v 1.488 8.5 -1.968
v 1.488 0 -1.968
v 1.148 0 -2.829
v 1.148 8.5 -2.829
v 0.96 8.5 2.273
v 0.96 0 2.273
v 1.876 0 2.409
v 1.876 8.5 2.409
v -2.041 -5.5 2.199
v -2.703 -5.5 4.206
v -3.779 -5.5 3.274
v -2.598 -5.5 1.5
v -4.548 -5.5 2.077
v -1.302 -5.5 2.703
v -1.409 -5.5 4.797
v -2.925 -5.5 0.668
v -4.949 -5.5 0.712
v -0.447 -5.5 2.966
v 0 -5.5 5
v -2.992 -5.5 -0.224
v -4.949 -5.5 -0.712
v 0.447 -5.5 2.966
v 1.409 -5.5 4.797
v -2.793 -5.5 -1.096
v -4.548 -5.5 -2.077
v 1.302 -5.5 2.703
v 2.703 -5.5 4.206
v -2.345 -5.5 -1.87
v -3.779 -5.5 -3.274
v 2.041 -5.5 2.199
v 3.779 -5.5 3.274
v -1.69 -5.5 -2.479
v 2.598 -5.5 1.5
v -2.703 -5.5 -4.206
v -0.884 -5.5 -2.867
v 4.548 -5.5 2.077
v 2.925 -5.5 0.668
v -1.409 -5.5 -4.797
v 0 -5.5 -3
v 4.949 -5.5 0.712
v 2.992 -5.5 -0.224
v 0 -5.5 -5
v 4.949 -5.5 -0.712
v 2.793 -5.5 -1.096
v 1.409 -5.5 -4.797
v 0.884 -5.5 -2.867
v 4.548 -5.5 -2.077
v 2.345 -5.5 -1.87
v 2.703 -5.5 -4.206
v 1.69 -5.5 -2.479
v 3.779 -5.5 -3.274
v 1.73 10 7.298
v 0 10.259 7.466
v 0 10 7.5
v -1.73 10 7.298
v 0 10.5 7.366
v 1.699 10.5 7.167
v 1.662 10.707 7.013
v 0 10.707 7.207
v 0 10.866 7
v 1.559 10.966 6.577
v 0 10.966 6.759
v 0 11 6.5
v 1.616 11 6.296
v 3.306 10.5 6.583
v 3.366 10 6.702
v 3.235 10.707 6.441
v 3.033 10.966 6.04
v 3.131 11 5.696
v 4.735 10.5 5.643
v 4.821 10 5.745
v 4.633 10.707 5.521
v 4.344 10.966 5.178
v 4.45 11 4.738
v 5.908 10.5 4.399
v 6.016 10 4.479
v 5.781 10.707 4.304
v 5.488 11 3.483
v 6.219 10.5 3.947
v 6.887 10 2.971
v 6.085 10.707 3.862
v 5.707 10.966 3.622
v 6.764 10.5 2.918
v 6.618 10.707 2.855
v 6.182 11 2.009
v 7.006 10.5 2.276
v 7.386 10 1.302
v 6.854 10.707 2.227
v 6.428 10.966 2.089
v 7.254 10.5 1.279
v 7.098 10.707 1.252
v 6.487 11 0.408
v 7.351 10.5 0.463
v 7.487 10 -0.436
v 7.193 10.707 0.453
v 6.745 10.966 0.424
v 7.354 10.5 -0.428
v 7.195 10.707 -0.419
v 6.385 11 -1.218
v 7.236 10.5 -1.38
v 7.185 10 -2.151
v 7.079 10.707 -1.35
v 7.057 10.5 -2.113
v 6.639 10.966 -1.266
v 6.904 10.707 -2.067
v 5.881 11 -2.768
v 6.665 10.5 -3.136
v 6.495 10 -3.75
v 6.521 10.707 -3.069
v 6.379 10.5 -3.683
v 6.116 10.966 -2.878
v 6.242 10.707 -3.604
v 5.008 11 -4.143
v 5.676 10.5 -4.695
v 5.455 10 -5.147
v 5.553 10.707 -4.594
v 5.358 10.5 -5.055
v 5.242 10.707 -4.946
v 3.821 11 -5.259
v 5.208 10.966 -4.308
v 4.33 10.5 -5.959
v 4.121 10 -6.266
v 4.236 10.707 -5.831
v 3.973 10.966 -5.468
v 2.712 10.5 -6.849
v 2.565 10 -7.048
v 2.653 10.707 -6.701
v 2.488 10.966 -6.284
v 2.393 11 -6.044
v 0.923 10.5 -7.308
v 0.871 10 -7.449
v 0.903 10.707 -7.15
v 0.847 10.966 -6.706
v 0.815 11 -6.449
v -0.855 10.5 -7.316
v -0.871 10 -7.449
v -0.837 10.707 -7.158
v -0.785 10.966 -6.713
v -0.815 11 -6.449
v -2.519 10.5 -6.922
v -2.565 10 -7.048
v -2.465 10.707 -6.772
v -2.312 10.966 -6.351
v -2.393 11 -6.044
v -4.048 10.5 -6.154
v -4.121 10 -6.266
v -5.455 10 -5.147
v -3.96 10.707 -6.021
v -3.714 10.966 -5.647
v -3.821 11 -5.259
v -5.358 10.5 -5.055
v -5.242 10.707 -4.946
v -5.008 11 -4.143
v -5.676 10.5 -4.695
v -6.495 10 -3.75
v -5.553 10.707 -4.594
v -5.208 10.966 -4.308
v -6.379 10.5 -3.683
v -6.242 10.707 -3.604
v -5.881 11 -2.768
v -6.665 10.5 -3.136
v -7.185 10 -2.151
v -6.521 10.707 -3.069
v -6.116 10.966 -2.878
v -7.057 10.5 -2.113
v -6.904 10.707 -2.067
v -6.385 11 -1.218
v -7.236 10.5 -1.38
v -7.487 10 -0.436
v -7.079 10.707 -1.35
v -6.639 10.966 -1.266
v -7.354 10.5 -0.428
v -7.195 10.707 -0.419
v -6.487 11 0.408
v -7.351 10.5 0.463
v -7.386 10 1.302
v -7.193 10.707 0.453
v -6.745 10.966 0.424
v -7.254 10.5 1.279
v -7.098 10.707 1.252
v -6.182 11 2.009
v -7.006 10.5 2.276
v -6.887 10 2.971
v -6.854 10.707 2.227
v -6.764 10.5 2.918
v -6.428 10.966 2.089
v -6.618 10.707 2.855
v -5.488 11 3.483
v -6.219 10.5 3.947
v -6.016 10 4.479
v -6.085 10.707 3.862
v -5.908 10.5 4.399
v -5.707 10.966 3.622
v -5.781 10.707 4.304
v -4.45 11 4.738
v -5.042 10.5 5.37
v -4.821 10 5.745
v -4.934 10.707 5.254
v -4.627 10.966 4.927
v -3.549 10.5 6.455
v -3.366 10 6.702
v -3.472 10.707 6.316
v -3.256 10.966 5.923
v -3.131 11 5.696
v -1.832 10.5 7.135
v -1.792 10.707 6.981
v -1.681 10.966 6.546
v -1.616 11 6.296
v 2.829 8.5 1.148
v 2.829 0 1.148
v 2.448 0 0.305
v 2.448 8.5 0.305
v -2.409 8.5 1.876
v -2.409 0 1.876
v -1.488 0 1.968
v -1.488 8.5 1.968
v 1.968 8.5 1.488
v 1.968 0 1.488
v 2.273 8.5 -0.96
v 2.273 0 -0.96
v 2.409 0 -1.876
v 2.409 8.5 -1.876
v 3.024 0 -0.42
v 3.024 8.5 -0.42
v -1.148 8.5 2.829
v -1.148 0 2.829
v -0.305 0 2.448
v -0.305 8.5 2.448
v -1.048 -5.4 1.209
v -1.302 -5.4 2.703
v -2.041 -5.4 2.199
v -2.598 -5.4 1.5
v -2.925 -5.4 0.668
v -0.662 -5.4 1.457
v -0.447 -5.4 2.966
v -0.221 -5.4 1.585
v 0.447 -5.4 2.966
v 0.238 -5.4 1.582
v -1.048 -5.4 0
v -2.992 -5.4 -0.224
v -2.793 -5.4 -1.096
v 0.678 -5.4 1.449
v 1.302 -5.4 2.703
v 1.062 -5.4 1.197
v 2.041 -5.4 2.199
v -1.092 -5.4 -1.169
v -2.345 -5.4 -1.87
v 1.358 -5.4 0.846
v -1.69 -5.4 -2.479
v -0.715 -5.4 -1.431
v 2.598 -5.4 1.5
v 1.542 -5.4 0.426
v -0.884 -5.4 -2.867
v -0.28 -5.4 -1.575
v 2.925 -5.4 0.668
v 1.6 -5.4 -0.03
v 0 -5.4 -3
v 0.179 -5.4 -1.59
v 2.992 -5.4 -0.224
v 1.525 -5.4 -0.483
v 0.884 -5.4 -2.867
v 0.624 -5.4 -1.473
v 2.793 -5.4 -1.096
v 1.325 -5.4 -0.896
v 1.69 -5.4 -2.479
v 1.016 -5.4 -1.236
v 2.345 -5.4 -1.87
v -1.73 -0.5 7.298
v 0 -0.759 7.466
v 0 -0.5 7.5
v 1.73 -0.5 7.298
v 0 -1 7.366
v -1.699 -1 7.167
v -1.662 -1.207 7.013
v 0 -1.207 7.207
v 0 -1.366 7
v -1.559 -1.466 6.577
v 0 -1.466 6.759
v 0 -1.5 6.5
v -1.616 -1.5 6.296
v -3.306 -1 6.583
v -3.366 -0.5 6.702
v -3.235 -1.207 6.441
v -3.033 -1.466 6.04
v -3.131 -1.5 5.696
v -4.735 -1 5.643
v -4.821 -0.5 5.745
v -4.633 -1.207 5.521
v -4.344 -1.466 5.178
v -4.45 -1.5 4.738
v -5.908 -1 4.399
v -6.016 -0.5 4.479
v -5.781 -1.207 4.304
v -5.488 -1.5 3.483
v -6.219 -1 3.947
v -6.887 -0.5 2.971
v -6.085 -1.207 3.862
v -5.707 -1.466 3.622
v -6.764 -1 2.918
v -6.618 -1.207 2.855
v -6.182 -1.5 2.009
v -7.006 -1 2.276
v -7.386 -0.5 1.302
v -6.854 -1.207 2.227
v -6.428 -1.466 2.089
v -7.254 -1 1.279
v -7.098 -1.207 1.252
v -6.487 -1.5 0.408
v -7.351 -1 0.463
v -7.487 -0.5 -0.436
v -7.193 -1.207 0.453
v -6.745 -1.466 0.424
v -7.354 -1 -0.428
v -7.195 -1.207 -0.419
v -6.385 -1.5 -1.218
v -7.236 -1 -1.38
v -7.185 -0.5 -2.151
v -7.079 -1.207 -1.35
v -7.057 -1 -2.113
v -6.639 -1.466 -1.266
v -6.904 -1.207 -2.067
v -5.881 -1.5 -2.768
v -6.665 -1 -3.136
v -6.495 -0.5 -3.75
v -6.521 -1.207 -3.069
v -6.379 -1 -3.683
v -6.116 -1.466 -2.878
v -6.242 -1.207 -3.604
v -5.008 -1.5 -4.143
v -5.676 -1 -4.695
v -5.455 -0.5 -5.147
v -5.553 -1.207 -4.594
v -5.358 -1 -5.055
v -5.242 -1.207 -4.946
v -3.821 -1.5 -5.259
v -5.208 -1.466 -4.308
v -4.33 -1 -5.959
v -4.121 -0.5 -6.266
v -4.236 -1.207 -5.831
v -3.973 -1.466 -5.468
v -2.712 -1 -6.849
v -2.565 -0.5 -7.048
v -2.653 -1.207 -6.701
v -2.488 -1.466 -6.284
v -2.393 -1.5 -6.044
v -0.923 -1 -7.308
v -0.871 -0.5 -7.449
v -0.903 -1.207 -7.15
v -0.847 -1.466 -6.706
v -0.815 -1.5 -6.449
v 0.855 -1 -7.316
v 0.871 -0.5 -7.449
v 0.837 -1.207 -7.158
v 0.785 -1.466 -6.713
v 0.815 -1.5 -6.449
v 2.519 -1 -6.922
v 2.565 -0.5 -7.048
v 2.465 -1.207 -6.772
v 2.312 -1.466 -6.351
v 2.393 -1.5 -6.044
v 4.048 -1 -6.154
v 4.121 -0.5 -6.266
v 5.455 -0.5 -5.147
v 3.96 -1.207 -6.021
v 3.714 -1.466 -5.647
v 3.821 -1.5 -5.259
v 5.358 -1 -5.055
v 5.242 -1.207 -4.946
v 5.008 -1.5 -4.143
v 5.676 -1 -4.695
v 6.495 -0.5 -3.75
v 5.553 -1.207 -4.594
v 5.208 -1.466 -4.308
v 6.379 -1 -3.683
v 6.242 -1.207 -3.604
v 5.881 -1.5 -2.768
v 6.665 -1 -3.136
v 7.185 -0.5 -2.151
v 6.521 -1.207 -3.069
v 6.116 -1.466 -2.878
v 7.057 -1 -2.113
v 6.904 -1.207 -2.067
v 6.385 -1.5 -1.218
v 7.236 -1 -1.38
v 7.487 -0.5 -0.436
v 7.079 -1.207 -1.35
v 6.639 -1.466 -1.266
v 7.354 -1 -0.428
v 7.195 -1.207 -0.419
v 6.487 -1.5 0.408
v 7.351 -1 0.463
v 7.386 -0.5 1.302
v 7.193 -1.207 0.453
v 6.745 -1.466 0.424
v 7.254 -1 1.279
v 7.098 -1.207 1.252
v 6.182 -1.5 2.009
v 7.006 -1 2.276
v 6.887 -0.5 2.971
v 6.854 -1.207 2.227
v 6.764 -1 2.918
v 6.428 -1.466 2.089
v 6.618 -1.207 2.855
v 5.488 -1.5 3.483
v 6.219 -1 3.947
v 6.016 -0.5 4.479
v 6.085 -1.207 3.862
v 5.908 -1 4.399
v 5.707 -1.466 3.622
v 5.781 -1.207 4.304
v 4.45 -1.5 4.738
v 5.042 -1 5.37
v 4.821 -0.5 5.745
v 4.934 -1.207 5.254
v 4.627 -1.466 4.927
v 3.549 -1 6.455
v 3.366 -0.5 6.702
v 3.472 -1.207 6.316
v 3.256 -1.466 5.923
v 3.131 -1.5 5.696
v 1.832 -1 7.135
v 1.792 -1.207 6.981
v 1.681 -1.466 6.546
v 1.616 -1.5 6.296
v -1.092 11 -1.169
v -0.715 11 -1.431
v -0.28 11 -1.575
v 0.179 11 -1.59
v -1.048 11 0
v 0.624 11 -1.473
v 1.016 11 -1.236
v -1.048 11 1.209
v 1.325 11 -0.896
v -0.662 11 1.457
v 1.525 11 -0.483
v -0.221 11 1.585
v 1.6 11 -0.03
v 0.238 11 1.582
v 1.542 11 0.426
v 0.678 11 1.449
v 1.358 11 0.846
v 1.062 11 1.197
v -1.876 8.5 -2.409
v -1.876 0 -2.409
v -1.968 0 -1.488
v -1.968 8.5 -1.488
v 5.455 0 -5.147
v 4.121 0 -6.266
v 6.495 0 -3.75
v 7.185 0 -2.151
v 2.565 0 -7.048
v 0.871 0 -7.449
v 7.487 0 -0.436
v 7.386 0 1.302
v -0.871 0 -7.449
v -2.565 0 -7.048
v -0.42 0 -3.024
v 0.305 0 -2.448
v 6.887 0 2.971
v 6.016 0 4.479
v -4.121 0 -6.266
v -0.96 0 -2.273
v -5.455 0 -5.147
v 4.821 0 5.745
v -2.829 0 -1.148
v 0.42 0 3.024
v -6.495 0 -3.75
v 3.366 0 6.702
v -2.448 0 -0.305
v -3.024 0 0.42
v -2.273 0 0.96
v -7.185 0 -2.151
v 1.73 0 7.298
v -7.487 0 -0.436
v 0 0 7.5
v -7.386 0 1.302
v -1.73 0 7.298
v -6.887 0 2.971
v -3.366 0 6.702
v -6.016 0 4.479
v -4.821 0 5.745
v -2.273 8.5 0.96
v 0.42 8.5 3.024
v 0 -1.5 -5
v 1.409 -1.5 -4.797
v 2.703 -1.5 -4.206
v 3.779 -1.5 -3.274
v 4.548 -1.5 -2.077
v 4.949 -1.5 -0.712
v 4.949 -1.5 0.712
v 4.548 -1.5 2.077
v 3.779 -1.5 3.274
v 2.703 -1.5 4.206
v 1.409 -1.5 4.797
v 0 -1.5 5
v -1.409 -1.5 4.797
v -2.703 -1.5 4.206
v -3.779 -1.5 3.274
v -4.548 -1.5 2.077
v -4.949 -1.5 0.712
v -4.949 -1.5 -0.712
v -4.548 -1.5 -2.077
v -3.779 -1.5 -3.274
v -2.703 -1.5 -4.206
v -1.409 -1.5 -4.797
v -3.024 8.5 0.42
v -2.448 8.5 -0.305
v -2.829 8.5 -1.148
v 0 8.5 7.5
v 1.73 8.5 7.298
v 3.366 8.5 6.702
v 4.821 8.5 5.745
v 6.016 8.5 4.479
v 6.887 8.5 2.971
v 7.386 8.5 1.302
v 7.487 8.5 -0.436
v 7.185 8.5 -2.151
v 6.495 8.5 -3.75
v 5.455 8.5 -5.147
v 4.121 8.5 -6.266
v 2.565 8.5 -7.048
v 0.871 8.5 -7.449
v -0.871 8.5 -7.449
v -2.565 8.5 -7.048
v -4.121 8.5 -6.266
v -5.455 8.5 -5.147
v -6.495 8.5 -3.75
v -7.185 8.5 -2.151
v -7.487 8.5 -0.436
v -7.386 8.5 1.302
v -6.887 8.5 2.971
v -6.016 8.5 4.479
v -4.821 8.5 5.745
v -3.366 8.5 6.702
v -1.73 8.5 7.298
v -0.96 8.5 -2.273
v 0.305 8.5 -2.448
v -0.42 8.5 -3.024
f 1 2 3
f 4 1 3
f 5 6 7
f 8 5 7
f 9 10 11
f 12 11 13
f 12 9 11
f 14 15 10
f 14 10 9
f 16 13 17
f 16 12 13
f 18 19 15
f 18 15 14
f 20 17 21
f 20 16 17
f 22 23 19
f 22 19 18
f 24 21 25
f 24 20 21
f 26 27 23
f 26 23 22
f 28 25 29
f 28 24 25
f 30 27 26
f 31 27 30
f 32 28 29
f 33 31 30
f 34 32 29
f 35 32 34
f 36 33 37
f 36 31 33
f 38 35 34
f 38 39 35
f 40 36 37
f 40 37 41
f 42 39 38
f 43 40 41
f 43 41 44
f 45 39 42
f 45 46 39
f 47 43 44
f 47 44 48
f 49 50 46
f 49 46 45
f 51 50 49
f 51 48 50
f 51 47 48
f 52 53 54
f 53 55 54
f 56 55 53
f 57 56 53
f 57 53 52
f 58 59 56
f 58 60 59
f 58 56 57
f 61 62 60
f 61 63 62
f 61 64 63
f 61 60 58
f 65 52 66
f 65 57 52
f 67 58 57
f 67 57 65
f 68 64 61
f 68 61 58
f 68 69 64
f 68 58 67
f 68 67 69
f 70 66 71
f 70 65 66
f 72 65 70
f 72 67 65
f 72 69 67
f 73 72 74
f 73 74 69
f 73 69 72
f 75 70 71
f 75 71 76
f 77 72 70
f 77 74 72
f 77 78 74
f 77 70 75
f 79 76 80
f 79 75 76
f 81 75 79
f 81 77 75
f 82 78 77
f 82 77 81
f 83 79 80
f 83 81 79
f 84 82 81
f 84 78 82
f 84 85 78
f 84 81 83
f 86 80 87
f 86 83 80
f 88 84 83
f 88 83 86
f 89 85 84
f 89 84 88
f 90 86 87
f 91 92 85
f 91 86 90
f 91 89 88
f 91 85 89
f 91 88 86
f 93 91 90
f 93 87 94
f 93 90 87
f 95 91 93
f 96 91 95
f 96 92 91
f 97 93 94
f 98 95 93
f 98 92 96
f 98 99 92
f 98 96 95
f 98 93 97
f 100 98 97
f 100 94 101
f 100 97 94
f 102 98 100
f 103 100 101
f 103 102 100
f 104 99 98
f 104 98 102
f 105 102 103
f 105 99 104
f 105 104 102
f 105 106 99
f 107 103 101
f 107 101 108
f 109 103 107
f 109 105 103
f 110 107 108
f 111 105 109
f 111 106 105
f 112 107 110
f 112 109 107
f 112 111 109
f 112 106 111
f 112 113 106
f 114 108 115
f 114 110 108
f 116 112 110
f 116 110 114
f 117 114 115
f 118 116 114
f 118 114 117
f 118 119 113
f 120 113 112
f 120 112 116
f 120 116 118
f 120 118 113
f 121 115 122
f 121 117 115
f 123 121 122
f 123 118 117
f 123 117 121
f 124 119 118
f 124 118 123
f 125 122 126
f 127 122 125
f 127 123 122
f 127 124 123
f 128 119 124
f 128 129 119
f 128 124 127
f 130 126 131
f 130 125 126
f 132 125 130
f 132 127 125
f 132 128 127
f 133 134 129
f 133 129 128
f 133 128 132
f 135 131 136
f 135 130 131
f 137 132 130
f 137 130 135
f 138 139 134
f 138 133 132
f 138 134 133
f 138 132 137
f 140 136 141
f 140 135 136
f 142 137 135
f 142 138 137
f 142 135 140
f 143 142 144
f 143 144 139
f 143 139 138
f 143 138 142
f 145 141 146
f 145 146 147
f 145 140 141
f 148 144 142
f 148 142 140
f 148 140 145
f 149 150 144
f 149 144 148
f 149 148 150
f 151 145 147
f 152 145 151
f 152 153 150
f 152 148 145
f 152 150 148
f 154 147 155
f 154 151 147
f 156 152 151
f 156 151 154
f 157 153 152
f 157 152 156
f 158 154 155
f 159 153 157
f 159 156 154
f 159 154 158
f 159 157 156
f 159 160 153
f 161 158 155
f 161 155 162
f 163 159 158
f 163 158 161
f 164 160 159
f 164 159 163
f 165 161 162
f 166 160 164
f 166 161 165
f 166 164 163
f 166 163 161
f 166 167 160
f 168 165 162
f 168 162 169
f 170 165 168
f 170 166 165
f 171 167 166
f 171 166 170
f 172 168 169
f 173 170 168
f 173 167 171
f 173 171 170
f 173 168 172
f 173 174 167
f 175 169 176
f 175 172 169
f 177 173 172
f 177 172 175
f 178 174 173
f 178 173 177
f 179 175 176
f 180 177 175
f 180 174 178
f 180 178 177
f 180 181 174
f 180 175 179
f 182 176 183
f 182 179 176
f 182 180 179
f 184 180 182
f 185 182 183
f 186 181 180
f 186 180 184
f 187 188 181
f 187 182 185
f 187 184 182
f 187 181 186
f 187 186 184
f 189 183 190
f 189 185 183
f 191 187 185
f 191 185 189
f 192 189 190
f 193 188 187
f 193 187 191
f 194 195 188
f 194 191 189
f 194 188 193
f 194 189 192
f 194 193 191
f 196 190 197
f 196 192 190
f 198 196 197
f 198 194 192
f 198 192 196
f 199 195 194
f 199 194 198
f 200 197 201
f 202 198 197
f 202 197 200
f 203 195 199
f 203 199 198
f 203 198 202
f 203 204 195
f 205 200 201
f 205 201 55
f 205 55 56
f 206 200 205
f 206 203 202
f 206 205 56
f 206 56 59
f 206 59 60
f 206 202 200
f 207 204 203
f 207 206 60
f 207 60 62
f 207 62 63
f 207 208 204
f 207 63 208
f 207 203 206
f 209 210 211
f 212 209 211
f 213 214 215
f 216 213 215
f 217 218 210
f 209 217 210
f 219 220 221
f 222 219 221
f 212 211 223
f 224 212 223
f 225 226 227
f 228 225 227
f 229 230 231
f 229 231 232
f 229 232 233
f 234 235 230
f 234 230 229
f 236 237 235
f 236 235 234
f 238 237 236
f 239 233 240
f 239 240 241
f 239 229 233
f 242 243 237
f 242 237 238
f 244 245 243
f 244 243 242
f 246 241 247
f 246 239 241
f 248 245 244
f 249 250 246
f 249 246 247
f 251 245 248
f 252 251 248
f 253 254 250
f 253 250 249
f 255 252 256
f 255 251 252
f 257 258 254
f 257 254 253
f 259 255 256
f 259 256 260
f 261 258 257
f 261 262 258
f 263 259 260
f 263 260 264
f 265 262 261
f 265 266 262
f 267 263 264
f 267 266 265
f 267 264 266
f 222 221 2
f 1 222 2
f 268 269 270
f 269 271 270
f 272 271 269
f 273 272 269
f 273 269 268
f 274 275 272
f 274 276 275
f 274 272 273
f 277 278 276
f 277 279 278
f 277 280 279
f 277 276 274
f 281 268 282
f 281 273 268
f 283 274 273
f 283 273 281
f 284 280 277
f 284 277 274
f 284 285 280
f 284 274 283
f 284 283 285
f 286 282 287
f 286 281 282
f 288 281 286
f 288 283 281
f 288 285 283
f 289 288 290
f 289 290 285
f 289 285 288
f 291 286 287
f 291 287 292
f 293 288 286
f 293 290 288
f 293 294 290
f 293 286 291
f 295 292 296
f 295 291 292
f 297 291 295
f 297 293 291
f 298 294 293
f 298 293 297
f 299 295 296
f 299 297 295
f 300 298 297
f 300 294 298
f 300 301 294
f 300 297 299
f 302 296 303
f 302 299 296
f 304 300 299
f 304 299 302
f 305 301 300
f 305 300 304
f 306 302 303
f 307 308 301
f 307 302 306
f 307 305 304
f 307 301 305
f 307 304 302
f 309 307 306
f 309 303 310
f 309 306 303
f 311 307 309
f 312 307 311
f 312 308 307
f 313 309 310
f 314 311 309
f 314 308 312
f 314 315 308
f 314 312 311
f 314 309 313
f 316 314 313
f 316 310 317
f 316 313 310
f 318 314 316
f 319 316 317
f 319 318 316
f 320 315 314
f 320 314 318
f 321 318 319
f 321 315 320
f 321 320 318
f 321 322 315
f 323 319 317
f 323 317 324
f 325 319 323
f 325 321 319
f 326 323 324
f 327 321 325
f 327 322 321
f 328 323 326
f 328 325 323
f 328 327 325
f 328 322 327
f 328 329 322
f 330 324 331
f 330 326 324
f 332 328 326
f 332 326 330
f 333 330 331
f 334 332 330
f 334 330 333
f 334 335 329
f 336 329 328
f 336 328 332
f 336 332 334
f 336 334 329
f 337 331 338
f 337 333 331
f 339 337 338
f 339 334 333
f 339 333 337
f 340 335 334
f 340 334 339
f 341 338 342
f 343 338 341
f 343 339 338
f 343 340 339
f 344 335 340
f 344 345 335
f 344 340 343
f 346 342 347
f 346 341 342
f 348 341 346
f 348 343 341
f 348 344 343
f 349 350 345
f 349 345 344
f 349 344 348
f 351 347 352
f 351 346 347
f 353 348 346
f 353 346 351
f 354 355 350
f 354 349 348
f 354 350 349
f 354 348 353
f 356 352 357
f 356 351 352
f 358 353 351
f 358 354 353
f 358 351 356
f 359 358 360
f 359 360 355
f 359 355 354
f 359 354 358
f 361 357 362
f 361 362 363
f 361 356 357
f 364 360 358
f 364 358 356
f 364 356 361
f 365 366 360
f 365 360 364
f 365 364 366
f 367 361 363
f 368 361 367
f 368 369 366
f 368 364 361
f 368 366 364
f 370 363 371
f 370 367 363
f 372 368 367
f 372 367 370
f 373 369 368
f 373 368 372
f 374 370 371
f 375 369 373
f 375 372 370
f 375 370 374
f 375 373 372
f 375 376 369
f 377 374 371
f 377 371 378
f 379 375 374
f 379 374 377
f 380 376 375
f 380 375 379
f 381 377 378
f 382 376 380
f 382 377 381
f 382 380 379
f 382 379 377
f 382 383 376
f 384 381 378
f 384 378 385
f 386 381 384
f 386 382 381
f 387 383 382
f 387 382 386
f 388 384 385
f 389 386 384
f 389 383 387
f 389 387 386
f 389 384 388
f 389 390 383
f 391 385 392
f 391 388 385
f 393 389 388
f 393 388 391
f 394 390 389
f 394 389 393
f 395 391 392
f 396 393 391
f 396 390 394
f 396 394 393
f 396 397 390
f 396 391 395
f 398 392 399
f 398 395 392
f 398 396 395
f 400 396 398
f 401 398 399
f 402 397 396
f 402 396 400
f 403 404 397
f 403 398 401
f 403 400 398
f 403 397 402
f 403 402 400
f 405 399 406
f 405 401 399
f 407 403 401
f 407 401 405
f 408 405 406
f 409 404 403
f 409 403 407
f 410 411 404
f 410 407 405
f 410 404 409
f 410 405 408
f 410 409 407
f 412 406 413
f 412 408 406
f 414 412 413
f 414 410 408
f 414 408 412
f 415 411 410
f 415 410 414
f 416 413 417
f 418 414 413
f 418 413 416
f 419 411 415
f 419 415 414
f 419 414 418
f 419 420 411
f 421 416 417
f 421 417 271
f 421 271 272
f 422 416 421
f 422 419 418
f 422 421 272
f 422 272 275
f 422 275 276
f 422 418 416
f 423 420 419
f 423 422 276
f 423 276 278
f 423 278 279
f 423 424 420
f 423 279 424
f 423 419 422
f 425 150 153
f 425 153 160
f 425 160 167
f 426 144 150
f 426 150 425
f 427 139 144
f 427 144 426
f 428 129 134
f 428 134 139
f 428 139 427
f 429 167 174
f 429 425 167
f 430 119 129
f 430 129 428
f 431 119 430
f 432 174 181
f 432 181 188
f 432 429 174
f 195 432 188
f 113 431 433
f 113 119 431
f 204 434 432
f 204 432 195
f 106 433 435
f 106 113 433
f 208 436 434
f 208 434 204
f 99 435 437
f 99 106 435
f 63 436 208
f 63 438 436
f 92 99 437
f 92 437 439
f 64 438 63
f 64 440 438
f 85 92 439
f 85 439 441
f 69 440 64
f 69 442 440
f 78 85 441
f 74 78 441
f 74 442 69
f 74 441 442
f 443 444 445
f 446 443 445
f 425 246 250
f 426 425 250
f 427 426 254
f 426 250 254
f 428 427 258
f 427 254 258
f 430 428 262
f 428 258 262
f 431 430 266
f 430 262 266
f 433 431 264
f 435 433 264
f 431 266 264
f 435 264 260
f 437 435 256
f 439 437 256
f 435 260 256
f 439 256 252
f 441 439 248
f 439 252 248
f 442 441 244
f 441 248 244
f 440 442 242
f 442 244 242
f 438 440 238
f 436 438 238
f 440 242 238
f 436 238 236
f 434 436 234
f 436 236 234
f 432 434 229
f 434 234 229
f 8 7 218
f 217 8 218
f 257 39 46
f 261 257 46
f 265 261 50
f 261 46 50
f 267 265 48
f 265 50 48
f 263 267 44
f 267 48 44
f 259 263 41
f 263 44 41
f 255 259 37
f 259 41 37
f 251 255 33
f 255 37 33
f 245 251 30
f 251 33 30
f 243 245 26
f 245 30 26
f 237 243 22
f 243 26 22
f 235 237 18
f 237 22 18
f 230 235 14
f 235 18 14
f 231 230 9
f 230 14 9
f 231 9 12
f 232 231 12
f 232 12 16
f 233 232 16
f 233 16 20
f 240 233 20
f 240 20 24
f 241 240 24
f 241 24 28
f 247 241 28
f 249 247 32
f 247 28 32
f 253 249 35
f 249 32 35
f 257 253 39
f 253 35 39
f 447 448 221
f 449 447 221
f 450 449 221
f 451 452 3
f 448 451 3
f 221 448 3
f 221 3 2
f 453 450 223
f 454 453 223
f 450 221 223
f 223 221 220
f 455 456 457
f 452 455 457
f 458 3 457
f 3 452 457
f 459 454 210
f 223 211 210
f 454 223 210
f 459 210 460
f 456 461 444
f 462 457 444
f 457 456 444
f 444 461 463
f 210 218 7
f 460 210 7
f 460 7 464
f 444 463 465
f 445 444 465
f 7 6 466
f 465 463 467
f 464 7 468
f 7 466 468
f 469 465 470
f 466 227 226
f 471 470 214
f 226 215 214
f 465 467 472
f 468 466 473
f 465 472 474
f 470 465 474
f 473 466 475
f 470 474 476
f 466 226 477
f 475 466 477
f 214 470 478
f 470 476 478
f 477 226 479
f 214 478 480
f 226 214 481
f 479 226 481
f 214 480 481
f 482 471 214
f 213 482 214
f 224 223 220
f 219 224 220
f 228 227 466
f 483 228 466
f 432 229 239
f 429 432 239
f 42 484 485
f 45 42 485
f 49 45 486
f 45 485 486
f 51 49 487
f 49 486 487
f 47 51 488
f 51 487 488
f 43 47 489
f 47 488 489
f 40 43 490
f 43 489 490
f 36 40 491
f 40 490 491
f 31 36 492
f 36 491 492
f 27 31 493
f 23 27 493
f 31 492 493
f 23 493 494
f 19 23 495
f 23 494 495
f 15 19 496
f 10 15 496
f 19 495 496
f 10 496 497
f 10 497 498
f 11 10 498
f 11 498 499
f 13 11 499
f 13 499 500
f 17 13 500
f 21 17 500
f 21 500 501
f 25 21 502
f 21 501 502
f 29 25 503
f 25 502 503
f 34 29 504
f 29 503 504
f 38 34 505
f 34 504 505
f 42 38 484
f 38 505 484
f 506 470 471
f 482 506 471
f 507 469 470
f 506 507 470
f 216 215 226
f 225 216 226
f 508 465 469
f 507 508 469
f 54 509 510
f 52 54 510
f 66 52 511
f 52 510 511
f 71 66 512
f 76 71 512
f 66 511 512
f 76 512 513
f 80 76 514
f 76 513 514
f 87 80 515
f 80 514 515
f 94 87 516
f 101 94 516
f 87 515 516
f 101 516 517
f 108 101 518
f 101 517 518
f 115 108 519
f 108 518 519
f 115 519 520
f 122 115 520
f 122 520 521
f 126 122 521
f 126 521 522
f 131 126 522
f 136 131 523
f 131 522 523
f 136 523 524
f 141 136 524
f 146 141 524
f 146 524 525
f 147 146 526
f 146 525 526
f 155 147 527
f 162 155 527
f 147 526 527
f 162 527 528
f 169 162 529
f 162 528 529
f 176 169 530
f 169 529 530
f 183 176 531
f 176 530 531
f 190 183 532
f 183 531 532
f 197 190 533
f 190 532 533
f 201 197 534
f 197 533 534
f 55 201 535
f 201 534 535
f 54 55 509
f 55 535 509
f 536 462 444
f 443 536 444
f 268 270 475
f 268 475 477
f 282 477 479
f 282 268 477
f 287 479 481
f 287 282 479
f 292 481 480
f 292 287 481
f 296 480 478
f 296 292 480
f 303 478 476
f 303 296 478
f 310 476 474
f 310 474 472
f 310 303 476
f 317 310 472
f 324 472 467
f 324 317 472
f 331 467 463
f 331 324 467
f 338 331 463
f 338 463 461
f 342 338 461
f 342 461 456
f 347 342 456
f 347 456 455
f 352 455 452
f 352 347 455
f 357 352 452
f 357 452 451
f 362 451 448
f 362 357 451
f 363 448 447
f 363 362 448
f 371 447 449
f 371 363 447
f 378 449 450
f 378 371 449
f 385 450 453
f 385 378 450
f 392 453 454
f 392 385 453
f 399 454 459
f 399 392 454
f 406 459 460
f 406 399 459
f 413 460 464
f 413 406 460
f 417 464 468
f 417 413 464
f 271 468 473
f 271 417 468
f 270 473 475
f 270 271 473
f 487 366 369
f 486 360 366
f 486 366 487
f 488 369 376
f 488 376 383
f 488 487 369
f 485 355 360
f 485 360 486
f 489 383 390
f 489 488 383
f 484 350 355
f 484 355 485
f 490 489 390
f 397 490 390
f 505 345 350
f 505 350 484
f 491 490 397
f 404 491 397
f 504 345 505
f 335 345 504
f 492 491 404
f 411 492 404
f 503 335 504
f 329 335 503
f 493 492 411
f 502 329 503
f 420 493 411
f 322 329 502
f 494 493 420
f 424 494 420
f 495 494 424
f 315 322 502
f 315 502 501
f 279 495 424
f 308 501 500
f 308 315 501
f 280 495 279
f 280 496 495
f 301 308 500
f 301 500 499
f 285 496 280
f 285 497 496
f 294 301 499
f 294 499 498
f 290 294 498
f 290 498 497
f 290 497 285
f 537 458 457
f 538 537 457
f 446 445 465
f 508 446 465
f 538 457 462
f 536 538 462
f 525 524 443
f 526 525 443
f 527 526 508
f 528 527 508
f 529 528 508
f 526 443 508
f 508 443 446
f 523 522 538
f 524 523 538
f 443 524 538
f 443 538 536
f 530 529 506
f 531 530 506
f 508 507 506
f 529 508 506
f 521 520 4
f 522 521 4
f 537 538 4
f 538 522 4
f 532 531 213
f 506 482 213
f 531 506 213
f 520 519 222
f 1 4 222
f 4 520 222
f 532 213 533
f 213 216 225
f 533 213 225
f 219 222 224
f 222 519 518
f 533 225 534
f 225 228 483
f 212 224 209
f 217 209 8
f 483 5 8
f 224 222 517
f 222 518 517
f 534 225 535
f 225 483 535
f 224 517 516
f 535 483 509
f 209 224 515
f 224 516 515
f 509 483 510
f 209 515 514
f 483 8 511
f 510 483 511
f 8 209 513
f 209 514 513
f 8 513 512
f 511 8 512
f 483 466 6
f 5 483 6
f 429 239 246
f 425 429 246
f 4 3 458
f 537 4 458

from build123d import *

# Parameters (mm, degrees)
BOSS_EXTRU_2_DEPTH      = 8.5
ESQUISSE2_R             = 7.5
BOSS_EXTRU_3_DEPTH      = 2.5
BOSS_EXTRU_4_START      = 1.5
ESQUISSE3_R             = 7.5
BOSS_EXTRU_4_DEPTH      = 1.5
ESQUISSE4_R             = 5
BOSS_EXTRU_5_DEPTH      = 4
ESQUISSE6_R             = 3
ENL_V_MAT_EXTRU_2_DEPTH = 0.1
CONG_4_R                = 1
ENL_V_MAT_EXTRU_3_DEPTH = 20.531001075


with BuildPart() as part:
    # Esquisse1 → Boss.-Extru.2 (new body)
    with BuildSketch(Plane(origin=(0, 0, 0), x_dir=(1, 0, 0), z_dir=(0, 1, 0))):
        Polygon((2.408977243, 1.875974594), (1.487996247, 1.96815707), (1.148248192, 2.829130277), (0.304564016, 2.448472144), (-0.420153034, 3.024222787), (-0.960475898, 2.272721085), (-1.875974594, 2.408977243), (-1.96815707, 1.487996247), (-2.829130277, 1.148248192), (-2.448472144, 0.304564016), (-3.024222787, -0.420153034), (-2.272721085, -0.960475898), (-2.408977243, -1.875974594), (-1.487996247, -1.96815707), (-1.148248192, -2.829130277), (-0.304564016, -2.448472144), (0.420153034, -3.024222787), (0.960475898, -2.272721085), (1.875974594, -2.408977243), (1.96815707, -1.487996247), (2.829130277, -1.148248192), (2.448472144, -0.304564016), (3.024222787, 0.420153034), (2.272721085, 0.960475898), align=None)
    extrude(amount=BOSS_EXTRU_2_DEPTH)

    # Esquisse2 → Boss.-Extru.3 (add)
    with BuildSketch(Plane(origin=(0, 8.5, 0), x_dir=(1, 0, 0), z_dir=(0, 1, 0))):
        with Locations(Location((0, 0, 0), (0, 0, 270))):
            Circle(ESQUISSE2_R)
    extrude(amount=BOSS_EXTRU_3_DEPTH)

    # Esquisse3 → Boss.-Extru.4 (add)
    with BuildSketch(Plane.XZ.offset(BOSS_EXTRU_4_START)):
        with Locations(Location((0, 0, 0), (0, 0, 90))):
            Circle(ESQUISSE3_R)
    extrude(amount=-BOSS_EXTRU_4_DEPTH)

    # Esquisse4 → Boss.-Extru.5 (add)
    with BuildSketch(Plane.XZ.offset(1.5)):
        with Locations(Location((0, 0, 0), (0, 0, 270))):
            Circle(ESQUISSE4_R)
    extrude(amount=BOSS_EXTRU_5_DEPTH)

    # Esquisse6 → Enlèv. mat.-Extru.2 (cut)
    with BuildSketch(Plane.XZ.offset(5.5)):
        with Locations(Location((0, 0, 0), (0, 0, 270))):
            Circle(ESQUISSE6_R)
    extrude(amount=-ENL_V_MAT_EXTRU_2_DEPTH, mode=Mode.SUBTRACT)

    # Congé4
    cong_4_edges = [part.edges().sort_by_distance(p)[0] for p in [
        (0, 11, -7.5),
        (0, -1.5, -7.5),
    ]]
    fillet(cong_4_edges, radius=CONG_4_R)

    # Esquisse7 → Enlèv. mat.-Extru.3 (cut, through all)
    with BuildSketch(Plane.XZ.offset(5.4)):
        with BuildLine():
            Line((-1.048275862, 0), (-1.092437897, -1.169007888))
            ThreePointArc((-1.092437897, -1.169007888), (1.599724111, -0.029711421), (-1.048275862, 1.208767023))
            Line((-1.048275862, 1.208767023), (-1.048275862, 0))
        make_face()
    extrude(amount=-ENL_V_MAT_EXTRU_3_DEPTH, mode=Mode.SUBTRACT)


solid = part.part
